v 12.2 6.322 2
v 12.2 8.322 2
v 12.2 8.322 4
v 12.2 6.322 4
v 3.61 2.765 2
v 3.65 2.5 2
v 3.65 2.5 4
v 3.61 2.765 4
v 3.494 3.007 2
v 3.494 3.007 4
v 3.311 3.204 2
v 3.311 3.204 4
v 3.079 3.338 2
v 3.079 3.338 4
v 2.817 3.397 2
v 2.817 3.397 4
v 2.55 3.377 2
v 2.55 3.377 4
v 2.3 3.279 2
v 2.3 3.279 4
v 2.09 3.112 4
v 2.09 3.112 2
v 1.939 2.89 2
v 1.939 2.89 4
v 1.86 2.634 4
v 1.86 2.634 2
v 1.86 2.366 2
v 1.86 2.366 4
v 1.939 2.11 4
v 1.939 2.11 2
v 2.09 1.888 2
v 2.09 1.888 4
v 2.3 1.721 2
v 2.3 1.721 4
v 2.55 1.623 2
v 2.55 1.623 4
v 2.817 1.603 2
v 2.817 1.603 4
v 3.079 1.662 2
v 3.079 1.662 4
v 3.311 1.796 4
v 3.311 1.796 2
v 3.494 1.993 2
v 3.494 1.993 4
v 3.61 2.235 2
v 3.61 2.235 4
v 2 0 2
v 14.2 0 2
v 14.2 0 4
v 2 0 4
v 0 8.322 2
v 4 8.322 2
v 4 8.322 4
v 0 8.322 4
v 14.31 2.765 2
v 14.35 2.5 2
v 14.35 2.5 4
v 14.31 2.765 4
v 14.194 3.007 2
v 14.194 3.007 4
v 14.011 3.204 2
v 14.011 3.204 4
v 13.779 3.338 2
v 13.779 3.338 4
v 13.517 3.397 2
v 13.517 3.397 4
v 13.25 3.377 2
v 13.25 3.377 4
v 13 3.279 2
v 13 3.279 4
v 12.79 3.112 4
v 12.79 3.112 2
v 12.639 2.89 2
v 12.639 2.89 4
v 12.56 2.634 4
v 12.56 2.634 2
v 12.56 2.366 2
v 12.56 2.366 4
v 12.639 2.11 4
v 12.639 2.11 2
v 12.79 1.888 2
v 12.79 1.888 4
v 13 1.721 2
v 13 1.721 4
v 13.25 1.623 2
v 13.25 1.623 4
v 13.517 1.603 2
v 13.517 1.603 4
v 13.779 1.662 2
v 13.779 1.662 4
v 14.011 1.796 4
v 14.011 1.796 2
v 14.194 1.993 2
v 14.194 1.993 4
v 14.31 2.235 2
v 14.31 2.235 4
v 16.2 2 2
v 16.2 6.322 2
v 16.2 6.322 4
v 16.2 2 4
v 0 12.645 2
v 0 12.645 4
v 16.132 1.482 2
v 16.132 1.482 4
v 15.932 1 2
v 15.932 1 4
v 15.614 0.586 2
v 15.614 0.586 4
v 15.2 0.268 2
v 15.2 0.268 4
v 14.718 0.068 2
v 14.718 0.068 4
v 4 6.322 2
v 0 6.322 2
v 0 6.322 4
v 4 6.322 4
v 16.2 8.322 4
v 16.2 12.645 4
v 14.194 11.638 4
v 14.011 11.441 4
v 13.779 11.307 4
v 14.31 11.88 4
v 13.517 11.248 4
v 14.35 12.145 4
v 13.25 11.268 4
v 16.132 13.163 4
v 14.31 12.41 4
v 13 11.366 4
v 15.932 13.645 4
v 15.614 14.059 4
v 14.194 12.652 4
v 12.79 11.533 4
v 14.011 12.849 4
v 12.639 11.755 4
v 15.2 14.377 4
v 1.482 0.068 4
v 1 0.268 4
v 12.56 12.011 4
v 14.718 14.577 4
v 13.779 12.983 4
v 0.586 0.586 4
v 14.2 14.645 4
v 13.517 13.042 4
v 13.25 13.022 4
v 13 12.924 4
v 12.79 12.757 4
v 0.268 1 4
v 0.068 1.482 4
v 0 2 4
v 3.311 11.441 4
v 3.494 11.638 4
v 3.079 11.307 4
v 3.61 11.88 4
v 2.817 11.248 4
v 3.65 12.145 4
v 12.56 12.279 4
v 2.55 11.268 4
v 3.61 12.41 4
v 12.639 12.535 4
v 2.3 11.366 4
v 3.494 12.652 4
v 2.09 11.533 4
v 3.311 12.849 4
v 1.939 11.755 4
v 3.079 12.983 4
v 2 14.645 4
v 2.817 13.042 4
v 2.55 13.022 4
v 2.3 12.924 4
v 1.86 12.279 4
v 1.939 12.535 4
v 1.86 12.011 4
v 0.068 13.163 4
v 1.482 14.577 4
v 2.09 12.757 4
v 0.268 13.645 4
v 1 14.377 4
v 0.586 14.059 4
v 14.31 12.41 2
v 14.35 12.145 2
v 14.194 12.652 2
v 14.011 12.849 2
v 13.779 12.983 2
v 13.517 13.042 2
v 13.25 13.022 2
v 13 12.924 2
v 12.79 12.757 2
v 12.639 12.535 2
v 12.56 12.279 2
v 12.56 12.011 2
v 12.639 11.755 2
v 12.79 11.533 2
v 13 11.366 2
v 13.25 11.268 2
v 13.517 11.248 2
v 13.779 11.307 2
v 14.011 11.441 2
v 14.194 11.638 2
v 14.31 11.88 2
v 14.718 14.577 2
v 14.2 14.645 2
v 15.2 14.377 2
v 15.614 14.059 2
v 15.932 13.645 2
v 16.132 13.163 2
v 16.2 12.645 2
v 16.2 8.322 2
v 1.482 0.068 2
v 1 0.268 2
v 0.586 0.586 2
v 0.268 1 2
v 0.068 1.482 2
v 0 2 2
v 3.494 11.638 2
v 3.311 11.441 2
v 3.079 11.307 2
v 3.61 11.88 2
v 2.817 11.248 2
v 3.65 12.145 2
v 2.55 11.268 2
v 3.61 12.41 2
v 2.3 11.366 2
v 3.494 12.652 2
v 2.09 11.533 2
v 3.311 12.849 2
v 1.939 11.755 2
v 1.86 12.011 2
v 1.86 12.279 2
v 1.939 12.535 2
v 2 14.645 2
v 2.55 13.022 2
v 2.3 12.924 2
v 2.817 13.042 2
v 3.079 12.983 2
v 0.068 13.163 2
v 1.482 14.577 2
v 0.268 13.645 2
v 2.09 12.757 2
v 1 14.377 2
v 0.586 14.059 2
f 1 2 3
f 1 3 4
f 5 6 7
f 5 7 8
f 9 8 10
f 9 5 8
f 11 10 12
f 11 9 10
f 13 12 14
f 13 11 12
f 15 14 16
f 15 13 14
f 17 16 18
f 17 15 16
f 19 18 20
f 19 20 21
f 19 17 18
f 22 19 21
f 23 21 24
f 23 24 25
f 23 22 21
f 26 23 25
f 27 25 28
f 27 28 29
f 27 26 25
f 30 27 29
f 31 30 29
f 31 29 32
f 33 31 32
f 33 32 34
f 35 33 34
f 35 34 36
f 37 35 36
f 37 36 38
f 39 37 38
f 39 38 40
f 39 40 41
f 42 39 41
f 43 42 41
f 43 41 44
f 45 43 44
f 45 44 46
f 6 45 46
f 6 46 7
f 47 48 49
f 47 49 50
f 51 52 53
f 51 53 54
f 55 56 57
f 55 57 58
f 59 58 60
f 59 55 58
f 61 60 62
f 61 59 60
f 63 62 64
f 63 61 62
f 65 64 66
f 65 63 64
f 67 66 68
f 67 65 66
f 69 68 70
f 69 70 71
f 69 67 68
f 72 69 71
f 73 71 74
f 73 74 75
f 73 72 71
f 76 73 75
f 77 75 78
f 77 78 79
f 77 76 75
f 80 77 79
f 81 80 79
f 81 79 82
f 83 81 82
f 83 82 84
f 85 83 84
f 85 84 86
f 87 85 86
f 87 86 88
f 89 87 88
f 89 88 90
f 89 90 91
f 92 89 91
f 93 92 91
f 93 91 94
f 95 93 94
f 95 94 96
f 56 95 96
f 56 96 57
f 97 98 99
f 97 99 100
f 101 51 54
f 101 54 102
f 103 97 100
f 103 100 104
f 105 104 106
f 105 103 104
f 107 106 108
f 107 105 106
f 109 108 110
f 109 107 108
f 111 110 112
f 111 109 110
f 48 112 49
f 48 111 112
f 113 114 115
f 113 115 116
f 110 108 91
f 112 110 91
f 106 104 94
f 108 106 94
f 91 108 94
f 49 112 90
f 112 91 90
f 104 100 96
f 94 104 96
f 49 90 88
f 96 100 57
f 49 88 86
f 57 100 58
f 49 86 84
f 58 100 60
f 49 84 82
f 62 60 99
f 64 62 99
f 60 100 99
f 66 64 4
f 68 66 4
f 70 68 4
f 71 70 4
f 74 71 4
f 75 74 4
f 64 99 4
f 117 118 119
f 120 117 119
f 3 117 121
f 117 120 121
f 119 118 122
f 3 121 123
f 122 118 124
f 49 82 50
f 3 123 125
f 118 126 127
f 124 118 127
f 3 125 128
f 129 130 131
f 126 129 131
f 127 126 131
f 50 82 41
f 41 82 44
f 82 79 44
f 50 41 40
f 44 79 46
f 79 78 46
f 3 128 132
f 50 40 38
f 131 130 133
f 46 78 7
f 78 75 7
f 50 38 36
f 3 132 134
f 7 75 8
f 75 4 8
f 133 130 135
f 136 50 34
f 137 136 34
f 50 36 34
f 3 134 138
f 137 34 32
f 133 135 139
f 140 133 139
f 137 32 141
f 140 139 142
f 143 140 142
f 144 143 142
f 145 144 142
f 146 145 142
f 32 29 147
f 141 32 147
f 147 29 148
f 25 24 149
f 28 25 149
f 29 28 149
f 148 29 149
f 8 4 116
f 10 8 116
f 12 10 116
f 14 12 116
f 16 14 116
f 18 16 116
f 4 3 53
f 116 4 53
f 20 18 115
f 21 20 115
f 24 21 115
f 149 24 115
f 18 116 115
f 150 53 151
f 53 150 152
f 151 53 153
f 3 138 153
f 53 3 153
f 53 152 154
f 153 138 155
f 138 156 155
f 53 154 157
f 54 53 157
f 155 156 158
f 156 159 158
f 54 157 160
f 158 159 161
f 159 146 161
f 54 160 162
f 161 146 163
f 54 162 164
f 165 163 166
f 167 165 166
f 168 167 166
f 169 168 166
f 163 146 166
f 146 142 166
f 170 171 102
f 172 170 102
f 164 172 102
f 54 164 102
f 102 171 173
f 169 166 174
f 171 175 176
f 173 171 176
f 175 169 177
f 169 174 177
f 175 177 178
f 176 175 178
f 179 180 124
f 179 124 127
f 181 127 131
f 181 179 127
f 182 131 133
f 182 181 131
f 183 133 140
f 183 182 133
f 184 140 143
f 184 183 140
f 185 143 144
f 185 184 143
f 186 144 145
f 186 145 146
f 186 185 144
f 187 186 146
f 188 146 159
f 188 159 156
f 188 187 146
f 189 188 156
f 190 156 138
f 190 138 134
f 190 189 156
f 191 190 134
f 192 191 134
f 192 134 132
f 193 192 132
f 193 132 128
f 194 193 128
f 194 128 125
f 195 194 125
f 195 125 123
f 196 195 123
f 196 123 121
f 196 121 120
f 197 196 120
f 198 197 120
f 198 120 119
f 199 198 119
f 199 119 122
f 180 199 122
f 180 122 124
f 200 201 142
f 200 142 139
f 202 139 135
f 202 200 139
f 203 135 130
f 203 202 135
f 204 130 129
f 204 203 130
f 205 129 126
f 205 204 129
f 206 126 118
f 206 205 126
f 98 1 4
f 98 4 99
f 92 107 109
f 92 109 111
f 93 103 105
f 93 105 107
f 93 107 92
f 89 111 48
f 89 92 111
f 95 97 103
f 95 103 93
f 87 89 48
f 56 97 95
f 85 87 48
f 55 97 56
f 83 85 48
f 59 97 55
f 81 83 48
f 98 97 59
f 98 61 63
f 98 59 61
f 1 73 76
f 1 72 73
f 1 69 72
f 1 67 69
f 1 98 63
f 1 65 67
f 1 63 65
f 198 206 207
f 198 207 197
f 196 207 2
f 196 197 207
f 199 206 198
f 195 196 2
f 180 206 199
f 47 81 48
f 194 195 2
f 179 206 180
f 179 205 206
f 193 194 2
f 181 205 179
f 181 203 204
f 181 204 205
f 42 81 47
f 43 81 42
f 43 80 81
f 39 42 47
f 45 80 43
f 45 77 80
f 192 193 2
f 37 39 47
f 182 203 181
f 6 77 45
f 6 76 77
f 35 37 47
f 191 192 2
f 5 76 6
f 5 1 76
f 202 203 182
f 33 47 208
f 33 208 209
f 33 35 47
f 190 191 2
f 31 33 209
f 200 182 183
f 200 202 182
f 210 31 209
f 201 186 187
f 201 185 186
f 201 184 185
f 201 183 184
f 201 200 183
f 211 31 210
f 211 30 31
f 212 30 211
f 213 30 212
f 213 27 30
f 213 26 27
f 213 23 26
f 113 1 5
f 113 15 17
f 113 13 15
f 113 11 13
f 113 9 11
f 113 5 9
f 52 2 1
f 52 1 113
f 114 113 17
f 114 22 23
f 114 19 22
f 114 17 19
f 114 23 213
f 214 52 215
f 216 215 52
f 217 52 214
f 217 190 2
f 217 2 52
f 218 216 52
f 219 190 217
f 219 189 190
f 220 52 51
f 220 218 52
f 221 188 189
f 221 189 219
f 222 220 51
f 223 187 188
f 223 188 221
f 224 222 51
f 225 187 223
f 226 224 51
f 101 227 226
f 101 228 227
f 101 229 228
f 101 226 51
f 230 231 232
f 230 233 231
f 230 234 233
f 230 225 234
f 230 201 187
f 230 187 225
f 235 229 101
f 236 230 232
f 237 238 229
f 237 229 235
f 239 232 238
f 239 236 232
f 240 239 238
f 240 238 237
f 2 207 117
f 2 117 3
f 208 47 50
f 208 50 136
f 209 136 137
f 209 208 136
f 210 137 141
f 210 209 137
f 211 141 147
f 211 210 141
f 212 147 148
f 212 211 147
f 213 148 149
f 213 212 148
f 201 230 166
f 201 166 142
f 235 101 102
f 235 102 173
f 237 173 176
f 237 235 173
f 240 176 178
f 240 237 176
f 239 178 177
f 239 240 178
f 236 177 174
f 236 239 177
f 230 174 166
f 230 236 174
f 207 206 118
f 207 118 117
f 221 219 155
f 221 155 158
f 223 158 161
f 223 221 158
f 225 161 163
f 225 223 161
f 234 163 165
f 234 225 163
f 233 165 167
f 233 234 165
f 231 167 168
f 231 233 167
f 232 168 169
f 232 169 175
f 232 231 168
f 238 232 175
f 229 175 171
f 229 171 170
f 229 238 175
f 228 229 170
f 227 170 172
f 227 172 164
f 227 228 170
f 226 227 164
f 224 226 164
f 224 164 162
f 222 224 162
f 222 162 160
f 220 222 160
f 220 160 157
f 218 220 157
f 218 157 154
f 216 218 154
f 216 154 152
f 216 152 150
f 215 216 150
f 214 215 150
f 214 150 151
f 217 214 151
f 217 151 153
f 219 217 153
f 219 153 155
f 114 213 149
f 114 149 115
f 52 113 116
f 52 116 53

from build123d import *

# Parameters (mm, degrees)
SKETCH1_R           = 0.9
BOSS_EXTRUDE1_DEPTH = 4
SKETCH2_W           = 16.2
SKETCH2_H           = 14.645
CUT_EXTRUDE1_DEPTH  = 2


with BuildPart() as part:
    # Sketch1 → Boss-Extrude1 (new body)
    with BuildSketch(Plane.XY):
        with BuildLine():
            Line((2, 14.645), (14.2, 14.645))
            ThreePointArc((14.2, 14.645), (15.614213562, 14.059213562), (16.2, 12.645))
            Line((16.2, 12.645), (16.2, 8.3225))
            Line((16.2, 8.3225), (12.2, 8.3225))
            Line((12.2, 8.3225), (12.2, 6.3225))
            Line((12.2, 6.3225), (16.2, 6.3225))
            Line((16.2, 6.3225), (16.2, 2))
            ThreePointArc((16.2, 2), (15.614213562, 0.585786438), (14.2, 0))
            Line((14.2, 0), (2, 0))
            ThreePointArc((2, 0), (0.585786438, 0.585786438), (0, 2))
            Line((0, 2), (0, 6.3225))
            Line((0, 6.3225), (4, 6.3225))
            Line((4, 6.3225), (4, 8.3225))
            Line((4, 8.3225), (0, 8.3225))
            Line((0, 8.3225), (0, 12.645))
            ThreePointArc((0, 12.645), (0.585786438, 14.059213562), (2, 14.645))
        make_face()
        with Locations((2.75, 12.145)):
            Circle(SKETCH1_R, mode=Mode.SUBTRACT)
        with Locations((13.45, 2.5)):
            Circle(SKETCH1_R, mode=Mode.SUBTRACT)
        with Locations((13.45, 12.145)):
            Circle(SKETCH1_R, mode=Mode.SUBTRACT)
        with Locations((2.75, 2.5)):
            Circle(SKETCH1_R, mode=Mode.SUBTRACT)
    extrude(amount=BOSS_EXTRUDE1_DEPTH)

    # Sketch2 → Cut-Extrude1 (cut)
    with BuildSketch(Plane(origin=(0, 0, 0), x_dir=(-1, 0, 0), z_dir=(0, 0, -1))):
        with Locations((-8.1, 7.3225)):
            Rectangle(SKETCH2_W, SKETCH2_H)
    extrude(amount=-CUT_EXTRUDE1_DEPTH, mode=Mode.SUBTRACT)


solid = part.part
